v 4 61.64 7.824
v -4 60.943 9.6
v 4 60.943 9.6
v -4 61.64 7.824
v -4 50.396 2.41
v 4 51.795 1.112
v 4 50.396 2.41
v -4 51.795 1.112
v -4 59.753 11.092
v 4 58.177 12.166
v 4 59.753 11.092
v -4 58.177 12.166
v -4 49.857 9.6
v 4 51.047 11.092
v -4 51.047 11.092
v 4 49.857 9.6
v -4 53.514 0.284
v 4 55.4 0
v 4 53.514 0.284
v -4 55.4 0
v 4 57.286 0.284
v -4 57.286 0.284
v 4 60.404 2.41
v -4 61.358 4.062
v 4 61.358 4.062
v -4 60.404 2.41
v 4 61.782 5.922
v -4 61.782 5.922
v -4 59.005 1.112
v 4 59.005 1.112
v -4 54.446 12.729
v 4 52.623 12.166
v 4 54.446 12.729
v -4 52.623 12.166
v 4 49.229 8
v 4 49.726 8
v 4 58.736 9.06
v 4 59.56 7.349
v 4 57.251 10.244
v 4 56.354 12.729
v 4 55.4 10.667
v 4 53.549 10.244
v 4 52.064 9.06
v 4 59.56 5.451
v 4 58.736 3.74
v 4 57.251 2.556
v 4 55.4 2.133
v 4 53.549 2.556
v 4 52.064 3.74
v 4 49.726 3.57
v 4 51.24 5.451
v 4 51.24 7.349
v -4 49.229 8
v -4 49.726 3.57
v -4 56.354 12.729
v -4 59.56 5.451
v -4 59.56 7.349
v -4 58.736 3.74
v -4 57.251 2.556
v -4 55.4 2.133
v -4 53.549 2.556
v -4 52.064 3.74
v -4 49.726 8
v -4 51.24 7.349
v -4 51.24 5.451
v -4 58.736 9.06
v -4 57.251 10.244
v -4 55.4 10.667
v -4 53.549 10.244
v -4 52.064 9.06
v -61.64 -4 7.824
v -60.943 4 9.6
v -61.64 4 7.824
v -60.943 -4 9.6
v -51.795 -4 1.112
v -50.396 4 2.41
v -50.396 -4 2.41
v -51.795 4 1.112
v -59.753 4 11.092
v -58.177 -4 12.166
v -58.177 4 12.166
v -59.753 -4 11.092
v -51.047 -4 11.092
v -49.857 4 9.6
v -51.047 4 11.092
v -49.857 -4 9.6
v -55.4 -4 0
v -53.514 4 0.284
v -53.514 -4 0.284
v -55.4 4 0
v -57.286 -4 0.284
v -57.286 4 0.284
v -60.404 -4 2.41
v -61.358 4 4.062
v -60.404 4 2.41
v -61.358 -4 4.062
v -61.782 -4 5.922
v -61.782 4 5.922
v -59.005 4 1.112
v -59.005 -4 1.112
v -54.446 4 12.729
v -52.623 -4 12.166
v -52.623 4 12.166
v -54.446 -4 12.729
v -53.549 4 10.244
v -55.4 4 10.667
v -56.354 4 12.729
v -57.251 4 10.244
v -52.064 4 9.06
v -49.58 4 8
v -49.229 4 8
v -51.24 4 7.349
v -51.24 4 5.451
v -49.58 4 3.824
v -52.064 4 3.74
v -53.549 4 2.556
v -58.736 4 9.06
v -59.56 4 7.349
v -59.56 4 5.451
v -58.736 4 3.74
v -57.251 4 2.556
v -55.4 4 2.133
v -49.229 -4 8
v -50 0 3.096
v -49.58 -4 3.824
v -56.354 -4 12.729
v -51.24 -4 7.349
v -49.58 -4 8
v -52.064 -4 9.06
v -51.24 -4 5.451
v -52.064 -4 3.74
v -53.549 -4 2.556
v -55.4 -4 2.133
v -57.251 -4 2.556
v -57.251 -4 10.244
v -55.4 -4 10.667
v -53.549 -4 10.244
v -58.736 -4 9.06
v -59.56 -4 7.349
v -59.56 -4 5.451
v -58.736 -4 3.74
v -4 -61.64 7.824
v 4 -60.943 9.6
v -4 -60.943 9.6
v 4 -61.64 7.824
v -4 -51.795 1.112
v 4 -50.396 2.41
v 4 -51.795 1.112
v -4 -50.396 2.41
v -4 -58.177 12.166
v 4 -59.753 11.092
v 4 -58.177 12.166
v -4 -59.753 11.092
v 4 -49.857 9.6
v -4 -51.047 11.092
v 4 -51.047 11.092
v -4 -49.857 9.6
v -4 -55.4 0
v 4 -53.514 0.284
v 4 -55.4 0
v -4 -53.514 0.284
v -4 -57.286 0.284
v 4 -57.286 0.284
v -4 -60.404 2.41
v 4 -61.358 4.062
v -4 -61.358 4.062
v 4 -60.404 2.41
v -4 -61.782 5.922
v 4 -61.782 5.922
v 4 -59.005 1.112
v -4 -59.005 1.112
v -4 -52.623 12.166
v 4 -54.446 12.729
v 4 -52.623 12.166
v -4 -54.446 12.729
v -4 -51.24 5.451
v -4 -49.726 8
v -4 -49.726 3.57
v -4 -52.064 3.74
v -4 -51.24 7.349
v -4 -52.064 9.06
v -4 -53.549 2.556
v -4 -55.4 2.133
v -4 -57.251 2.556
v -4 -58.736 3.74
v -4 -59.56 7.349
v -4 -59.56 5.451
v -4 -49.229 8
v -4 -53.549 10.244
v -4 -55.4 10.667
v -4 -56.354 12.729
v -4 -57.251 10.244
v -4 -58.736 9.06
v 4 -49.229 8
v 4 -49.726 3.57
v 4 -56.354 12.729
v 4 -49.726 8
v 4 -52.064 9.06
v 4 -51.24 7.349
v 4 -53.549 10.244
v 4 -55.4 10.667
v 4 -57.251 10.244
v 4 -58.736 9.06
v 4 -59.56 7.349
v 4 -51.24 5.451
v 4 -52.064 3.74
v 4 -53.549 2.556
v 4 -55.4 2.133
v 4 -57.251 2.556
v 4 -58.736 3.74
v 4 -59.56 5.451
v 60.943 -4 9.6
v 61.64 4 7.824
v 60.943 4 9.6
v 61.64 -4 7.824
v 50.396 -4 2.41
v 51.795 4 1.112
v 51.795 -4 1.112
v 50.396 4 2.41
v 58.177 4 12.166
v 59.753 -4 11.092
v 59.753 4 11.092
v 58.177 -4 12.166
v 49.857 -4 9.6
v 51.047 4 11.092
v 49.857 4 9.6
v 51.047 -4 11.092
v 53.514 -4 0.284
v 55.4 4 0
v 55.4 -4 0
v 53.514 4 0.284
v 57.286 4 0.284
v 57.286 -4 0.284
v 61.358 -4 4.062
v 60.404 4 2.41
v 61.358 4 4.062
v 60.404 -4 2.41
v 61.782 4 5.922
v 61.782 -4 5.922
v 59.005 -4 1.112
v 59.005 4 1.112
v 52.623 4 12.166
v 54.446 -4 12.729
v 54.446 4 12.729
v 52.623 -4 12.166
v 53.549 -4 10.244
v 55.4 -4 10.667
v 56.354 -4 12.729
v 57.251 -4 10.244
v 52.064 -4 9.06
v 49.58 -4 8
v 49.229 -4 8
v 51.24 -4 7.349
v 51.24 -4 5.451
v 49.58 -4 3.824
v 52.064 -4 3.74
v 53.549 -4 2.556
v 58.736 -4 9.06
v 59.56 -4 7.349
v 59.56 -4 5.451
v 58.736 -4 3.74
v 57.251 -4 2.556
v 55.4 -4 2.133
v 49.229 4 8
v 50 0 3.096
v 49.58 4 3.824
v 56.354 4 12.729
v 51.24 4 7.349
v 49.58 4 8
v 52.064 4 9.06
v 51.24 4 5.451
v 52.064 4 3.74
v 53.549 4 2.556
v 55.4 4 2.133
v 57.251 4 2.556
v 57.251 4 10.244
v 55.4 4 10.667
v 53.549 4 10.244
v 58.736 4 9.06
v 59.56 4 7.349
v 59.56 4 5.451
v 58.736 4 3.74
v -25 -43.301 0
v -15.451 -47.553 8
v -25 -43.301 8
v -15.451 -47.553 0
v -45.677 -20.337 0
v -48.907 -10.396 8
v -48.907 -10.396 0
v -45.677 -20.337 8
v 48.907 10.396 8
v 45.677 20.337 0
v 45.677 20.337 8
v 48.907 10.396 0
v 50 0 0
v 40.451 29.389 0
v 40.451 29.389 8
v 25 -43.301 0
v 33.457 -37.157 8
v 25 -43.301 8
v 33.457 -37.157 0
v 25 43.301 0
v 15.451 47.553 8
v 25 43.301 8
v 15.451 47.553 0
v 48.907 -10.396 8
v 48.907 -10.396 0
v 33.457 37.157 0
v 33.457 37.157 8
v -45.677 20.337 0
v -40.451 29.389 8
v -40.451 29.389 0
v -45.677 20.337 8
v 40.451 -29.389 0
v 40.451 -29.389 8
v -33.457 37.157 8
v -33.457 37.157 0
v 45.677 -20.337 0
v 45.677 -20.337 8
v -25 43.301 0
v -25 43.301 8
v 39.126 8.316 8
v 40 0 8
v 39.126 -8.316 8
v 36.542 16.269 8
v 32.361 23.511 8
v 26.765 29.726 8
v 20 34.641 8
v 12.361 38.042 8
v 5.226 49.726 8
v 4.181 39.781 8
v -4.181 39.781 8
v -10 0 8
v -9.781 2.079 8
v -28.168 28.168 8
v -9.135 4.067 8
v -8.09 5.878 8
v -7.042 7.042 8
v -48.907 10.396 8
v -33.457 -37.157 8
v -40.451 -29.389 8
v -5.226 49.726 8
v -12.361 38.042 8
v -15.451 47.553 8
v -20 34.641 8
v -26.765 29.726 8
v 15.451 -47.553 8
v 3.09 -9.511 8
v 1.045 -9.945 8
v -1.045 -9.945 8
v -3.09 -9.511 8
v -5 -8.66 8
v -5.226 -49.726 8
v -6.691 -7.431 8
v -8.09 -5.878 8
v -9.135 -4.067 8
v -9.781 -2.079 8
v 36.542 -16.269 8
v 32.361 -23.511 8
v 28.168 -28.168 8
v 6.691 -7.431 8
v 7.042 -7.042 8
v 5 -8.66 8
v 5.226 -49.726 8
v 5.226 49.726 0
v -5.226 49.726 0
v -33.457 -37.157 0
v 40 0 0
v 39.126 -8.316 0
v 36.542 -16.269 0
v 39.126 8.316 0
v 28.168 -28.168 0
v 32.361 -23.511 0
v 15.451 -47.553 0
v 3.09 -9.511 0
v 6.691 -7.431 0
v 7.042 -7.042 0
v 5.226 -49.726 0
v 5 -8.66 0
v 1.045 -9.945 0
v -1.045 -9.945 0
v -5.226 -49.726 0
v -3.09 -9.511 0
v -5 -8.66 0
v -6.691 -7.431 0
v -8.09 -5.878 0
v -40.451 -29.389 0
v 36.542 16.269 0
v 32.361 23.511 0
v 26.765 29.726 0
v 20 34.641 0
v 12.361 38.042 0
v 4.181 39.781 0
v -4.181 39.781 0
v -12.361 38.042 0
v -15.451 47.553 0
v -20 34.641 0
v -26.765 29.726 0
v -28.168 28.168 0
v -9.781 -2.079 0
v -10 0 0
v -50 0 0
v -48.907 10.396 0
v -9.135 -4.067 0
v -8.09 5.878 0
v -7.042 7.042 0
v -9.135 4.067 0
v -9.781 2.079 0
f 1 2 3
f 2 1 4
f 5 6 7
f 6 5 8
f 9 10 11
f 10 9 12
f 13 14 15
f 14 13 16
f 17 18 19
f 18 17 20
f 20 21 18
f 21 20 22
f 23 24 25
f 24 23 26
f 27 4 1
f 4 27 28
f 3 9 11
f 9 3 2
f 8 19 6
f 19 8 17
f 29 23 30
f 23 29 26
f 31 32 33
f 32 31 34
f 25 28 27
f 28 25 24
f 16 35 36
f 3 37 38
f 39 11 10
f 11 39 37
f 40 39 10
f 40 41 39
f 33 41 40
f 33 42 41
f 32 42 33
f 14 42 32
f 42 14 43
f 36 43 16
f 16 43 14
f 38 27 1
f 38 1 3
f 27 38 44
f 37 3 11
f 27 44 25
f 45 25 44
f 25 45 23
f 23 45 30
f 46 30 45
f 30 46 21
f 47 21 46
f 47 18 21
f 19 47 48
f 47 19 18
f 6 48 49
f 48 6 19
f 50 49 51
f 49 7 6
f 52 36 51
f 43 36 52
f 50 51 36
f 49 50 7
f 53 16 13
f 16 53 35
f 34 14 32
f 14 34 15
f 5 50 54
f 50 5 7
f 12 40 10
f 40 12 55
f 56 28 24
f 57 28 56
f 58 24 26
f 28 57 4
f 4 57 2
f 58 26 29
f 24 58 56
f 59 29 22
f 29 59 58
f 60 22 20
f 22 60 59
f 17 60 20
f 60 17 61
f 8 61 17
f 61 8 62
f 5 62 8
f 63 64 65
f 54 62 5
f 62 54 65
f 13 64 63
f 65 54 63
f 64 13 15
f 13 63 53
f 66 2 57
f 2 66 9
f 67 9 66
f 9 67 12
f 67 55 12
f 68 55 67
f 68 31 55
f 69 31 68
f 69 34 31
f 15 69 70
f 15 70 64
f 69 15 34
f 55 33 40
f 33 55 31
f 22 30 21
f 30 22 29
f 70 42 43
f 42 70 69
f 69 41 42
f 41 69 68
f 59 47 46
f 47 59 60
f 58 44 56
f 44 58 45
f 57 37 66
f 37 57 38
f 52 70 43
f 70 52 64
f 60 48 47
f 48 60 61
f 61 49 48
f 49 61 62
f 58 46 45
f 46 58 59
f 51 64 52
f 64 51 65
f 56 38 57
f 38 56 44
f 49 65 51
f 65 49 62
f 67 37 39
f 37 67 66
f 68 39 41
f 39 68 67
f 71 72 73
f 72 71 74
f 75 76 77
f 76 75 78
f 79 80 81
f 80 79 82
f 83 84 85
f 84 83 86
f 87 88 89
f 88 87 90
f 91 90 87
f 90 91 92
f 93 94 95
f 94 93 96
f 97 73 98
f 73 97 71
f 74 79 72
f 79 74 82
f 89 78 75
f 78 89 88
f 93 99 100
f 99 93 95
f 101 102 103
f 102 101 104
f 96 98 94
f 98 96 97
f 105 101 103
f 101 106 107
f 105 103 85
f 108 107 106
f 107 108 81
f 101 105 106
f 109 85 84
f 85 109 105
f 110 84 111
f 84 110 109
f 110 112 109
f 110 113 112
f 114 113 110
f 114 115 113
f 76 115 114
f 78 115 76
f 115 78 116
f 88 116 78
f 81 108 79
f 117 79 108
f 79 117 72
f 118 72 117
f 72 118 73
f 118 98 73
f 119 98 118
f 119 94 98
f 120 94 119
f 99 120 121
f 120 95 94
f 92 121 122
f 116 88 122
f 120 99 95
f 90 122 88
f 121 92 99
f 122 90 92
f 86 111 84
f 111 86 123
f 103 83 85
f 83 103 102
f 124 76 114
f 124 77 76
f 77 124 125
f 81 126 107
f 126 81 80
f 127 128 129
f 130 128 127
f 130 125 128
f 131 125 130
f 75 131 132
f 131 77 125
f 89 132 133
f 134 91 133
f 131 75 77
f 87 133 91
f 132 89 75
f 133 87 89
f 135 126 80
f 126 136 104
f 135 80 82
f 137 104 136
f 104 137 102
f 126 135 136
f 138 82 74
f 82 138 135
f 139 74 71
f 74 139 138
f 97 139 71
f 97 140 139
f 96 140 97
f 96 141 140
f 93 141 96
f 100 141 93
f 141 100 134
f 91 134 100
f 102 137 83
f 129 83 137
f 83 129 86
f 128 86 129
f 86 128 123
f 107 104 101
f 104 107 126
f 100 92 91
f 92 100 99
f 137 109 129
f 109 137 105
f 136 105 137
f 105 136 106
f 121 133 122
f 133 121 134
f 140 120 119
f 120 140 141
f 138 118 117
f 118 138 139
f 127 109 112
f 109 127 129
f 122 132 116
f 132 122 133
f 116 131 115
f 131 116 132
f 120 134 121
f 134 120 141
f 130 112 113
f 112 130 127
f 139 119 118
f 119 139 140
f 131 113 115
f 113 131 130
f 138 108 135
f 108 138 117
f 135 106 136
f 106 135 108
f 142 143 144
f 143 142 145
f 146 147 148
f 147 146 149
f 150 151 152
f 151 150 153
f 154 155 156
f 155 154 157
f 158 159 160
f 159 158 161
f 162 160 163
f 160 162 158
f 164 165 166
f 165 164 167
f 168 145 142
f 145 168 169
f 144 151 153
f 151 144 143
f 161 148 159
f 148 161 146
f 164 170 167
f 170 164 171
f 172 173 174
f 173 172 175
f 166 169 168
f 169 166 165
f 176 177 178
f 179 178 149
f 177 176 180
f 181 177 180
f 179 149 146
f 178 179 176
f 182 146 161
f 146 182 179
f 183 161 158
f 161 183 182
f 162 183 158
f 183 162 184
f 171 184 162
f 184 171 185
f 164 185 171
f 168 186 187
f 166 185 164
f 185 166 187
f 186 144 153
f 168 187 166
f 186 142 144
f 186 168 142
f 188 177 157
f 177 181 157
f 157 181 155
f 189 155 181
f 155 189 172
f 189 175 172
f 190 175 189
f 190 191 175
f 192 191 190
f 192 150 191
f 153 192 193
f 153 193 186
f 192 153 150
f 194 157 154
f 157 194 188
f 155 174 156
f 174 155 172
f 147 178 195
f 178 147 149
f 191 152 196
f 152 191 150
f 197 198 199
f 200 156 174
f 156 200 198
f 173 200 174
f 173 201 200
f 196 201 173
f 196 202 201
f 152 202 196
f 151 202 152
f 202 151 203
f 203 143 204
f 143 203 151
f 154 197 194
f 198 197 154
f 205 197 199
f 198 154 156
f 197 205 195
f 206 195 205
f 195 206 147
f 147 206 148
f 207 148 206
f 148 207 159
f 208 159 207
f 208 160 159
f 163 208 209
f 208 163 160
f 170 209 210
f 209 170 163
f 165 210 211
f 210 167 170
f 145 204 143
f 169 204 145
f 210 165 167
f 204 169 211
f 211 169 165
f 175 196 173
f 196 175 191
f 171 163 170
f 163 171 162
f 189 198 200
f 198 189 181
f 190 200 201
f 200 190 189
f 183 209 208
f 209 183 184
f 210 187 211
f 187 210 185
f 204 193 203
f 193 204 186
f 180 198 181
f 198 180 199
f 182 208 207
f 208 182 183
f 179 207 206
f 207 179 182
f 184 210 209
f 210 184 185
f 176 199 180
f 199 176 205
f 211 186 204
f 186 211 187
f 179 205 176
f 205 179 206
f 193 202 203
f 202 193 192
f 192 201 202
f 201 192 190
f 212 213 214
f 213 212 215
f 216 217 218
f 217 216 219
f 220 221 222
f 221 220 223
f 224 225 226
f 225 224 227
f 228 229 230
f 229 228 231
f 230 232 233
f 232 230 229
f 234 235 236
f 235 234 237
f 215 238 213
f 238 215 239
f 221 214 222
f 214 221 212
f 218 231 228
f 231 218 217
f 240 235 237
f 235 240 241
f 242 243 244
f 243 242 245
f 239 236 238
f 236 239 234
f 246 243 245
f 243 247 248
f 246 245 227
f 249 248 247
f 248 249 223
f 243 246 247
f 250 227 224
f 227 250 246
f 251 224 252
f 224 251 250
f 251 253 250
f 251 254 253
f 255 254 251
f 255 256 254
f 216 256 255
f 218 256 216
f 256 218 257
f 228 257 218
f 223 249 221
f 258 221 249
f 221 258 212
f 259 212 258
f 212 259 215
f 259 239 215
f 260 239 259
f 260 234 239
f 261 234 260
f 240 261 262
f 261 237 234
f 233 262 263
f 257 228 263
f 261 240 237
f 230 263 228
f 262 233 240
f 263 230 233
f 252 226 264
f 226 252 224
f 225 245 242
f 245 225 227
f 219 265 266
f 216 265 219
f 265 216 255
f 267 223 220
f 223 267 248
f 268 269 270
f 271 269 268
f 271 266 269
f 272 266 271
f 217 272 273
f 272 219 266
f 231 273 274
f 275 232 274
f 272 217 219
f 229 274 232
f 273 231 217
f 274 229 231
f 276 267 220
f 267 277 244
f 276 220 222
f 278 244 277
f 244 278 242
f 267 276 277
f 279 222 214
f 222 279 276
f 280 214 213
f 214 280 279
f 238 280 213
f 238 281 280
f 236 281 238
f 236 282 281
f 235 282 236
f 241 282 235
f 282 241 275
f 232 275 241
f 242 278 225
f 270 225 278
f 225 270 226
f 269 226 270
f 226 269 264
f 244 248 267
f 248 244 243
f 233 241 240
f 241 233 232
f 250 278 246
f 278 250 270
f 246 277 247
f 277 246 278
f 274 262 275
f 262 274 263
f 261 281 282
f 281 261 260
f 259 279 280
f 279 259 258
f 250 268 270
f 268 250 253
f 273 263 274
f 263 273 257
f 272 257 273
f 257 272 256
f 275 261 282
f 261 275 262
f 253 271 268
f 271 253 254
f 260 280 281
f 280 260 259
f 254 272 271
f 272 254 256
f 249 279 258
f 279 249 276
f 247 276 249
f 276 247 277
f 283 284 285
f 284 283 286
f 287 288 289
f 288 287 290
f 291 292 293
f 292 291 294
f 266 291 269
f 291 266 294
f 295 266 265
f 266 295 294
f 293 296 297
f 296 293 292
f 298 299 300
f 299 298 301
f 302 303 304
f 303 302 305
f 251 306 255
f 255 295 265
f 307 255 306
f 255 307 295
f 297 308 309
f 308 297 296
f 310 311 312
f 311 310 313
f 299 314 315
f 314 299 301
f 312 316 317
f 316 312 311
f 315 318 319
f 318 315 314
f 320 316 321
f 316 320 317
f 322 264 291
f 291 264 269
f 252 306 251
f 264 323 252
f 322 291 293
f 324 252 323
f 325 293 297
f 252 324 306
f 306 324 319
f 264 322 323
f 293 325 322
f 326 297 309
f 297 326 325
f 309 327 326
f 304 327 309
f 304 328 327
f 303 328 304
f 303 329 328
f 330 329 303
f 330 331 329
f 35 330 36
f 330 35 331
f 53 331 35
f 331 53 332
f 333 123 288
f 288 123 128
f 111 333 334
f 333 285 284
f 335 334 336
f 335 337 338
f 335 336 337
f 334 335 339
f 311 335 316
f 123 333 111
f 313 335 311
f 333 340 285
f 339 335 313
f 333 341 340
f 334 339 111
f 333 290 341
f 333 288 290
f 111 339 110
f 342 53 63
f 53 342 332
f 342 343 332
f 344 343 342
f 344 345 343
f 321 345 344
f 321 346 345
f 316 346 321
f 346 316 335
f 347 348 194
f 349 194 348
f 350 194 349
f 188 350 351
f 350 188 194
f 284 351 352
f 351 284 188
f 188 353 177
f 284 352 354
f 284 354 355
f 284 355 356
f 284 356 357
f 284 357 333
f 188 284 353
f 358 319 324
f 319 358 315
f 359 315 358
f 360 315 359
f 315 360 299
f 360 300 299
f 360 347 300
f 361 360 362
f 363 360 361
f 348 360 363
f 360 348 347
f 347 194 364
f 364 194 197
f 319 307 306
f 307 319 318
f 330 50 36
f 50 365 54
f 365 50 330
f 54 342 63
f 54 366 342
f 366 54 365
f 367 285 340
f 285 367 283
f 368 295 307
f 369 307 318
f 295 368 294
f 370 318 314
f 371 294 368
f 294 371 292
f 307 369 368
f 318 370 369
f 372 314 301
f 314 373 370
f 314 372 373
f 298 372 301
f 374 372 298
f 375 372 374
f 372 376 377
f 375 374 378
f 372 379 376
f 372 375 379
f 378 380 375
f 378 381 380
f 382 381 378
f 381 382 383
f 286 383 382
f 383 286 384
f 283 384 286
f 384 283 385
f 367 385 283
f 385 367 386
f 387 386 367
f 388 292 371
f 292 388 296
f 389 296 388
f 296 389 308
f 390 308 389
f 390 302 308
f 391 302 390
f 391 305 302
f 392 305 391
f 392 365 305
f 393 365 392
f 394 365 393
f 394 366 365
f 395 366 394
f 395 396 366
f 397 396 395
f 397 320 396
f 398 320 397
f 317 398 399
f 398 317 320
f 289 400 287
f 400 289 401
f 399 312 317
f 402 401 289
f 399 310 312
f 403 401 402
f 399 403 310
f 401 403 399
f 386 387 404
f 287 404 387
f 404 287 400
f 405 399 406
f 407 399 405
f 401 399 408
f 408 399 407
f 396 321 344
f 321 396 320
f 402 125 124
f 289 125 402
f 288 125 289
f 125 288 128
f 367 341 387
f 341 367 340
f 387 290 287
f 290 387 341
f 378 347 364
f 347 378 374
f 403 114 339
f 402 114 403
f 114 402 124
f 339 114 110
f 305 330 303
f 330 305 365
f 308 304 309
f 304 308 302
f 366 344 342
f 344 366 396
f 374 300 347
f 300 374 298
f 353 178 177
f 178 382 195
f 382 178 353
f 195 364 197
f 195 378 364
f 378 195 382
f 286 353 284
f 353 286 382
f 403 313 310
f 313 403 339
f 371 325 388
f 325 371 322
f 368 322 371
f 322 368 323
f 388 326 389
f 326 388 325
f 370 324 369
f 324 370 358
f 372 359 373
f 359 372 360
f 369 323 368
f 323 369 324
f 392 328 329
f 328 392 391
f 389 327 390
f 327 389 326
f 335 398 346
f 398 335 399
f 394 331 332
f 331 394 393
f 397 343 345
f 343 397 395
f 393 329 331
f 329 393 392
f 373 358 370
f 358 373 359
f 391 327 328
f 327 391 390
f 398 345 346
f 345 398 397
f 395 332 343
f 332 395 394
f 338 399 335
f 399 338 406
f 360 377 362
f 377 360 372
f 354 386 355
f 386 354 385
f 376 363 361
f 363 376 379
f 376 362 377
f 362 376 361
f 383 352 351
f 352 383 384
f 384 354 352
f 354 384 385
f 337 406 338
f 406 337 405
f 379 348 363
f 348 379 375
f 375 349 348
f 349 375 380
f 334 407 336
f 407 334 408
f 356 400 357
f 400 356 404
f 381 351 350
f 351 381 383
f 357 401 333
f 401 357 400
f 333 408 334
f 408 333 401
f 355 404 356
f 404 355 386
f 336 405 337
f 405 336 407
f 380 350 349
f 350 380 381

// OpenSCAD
mm=1;//initial scale

pt=8*mm;//part thickness
pr=50*mm;//part radius
rs = 0.8;//ring size (proportion of part thickness)
hs=0.8;//hole size (proportion of part radius)
cs=0.2;//center hole size (proportion of part radius)

hr=pr*hs;
cr=pr*cs;

module ring(){
    rotate([0,0,90]) difference(){
        rotate([0,90,0]) cylinder(r=rs*pt,h=pt,center=true);
        rotate([0,90,0]) cylinder(r=rs*pt/1.5,h=pt*3,center=true);
    }
}

module fixations(){
    for (i = [0:3]){
            rotate((i+1)*90, [0,0,1]) translate([pr-1*mm+rs*pt, 0, 0]) ring();
        }
}

module holes(){
    union(){
        difference(){
            cylinder(r=hr,h=pt*3,center=true);
            rotate([0,0,-45]) translate([0,-pr,0]) cube([pr*2,pr*2,pr*2],center=true);
        }
        cylinder(r=cr,h=pt*3,center=true);
    }
}

module clamp(){
    //TODO
}

module gear(){
    //TODO
}

module base(){
    union(){
        difference(){
            cylinder(r=pr,h=pt);
        }
        translate([0,0,pt*rs]) fixations();
    }
}

difference(){
    base();
    holes();
}
